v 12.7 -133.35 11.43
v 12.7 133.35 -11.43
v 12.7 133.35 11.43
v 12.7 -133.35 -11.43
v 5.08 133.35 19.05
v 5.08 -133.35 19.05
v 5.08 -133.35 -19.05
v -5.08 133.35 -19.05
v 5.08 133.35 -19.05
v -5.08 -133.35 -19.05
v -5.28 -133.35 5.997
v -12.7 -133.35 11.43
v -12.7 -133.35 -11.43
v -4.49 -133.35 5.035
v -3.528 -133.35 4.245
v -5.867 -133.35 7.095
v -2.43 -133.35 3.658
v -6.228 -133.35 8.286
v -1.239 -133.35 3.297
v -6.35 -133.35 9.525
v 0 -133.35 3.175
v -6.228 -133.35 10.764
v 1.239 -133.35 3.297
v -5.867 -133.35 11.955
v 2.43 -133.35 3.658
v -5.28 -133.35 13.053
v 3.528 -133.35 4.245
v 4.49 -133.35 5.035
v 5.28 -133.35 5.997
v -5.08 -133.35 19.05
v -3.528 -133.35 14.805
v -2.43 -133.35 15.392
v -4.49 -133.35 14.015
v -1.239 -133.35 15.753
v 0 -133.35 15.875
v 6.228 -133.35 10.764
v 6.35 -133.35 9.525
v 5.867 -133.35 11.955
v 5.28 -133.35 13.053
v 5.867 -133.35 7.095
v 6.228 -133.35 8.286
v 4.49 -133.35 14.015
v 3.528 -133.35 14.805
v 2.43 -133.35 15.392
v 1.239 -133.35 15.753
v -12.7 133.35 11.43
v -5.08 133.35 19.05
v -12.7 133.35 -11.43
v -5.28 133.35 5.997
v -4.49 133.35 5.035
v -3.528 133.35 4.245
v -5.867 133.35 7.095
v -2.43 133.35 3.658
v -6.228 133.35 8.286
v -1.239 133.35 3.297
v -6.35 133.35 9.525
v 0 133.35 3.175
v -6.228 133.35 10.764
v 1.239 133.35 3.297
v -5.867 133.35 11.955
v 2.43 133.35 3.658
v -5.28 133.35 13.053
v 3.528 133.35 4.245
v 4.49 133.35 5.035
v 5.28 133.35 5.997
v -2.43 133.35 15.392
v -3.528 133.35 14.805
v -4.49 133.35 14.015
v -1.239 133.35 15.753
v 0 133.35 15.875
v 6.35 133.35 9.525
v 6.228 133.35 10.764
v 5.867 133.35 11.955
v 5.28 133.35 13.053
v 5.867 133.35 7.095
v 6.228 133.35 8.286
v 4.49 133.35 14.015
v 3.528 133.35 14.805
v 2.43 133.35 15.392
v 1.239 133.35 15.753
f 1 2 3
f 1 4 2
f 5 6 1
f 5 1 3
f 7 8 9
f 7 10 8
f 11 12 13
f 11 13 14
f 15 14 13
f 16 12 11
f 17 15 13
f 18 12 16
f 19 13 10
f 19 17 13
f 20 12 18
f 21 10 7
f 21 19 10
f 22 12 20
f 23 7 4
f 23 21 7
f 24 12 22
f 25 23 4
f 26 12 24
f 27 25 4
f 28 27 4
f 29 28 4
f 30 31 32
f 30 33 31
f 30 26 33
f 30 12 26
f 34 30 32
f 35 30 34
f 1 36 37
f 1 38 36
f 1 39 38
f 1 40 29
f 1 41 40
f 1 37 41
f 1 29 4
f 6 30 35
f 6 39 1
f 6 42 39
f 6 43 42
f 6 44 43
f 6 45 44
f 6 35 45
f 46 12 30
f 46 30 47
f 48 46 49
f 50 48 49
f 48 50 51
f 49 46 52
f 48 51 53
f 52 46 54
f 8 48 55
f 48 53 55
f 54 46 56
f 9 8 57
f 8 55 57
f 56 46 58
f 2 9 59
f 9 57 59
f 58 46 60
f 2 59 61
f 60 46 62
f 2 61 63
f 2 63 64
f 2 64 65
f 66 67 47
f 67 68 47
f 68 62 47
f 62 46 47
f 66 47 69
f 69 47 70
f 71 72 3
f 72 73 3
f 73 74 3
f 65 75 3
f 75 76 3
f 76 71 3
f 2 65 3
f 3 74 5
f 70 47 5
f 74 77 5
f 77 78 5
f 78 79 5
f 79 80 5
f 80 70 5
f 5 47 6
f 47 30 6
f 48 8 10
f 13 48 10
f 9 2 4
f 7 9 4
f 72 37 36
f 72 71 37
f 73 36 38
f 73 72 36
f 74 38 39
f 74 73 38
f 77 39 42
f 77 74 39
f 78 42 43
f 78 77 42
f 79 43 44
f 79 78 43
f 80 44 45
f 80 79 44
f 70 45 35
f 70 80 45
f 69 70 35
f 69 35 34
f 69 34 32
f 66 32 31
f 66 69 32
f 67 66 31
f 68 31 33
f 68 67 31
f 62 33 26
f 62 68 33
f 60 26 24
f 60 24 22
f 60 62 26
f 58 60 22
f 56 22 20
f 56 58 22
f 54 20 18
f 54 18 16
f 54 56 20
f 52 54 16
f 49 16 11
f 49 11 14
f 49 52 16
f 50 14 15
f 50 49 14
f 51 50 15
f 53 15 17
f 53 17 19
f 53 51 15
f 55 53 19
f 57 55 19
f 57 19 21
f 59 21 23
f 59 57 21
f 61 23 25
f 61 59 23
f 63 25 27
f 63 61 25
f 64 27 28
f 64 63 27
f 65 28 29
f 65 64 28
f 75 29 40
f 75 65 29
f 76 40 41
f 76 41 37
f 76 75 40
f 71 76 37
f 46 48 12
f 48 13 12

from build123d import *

# Parameters (mm, degrees)
F0_W     = 25.4
F0_H     = 38.1
F0_R     = 6.35
F1_DEPTH = 133.35
F2_SIZE  = 7.62
F3_SIZE  = 7.62
F4_SIZE  = 7.62
F5_SIZE  = 7.62


with BuildPart() as f1:
    # F0 (on Front) → F1 (new body, symmetric)
    with BuildSketch(Plane.XZ):
        Rectangle(F0_W, F0_H)
        with Locations((0, 9.525)):
            Circle(F0_R, mode=Mode.SUBTRACT)
    extrude(amount=F1_DEPTH, both=True)

    # F2
    f2_edges = [f1.edges().sort_by_distance(p)[0] for p in [
        (12.7, 0, 19.05),
    ]]
    chamfer(f2_edges, length=F2_SIZE)

    # F3
    f3_edges = [f1.edges().sort_by_distance(p)[0] for p in [
        (-12.7, 0, 19.05),
    ]]
    chamfer(f3_edges, length=F3_SIZE)

    # F4
    f4_edges = [f1.edges().sort_by_distance(p)[0] for p in [
        (-12.7, 0, -19.05),
    ]]
    chamfer(f4_edges, length=F4_SIZE)

    # F5
    f5_edges = [f1.edges().sort_by_distance(p)[0] for p in [
        (12.7, 0, -19.05),
    ]]
    chamfer(f5_edges, length=F5_SIZE)


solid = f1.part
